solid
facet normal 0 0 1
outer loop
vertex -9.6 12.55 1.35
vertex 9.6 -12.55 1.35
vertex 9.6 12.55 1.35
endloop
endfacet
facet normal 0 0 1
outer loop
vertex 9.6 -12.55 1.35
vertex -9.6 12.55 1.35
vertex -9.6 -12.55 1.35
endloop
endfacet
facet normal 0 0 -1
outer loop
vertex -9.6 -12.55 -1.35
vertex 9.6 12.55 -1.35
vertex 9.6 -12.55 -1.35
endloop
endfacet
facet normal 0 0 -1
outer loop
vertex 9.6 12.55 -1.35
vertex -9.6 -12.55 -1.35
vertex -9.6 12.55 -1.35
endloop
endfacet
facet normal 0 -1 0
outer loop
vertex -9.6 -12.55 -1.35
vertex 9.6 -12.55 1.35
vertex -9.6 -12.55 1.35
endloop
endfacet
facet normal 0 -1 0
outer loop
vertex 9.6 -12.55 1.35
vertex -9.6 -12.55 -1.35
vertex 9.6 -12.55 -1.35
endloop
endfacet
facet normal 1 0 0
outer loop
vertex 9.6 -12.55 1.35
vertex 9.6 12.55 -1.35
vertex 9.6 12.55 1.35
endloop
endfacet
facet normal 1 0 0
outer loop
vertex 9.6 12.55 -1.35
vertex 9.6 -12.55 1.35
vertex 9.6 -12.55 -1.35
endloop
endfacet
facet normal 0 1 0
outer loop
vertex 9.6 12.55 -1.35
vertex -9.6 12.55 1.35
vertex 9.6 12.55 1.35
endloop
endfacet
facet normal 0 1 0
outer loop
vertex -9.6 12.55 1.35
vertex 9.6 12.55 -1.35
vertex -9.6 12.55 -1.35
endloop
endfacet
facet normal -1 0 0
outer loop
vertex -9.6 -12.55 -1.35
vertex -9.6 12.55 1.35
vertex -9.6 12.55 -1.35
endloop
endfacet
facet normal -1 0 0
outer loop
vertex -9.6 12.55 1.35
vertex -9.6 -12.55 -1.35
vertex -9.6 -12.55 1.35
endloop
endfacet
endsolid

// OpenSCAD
module charger() {
    color("Steelblue") cube([19.2,25.1,2.7], center=true); //Bord
    //color("Silver") translate([0,9,1.25]) cube([7.6,9.2,5.2], center=true); //USB Plug
}
charger();
